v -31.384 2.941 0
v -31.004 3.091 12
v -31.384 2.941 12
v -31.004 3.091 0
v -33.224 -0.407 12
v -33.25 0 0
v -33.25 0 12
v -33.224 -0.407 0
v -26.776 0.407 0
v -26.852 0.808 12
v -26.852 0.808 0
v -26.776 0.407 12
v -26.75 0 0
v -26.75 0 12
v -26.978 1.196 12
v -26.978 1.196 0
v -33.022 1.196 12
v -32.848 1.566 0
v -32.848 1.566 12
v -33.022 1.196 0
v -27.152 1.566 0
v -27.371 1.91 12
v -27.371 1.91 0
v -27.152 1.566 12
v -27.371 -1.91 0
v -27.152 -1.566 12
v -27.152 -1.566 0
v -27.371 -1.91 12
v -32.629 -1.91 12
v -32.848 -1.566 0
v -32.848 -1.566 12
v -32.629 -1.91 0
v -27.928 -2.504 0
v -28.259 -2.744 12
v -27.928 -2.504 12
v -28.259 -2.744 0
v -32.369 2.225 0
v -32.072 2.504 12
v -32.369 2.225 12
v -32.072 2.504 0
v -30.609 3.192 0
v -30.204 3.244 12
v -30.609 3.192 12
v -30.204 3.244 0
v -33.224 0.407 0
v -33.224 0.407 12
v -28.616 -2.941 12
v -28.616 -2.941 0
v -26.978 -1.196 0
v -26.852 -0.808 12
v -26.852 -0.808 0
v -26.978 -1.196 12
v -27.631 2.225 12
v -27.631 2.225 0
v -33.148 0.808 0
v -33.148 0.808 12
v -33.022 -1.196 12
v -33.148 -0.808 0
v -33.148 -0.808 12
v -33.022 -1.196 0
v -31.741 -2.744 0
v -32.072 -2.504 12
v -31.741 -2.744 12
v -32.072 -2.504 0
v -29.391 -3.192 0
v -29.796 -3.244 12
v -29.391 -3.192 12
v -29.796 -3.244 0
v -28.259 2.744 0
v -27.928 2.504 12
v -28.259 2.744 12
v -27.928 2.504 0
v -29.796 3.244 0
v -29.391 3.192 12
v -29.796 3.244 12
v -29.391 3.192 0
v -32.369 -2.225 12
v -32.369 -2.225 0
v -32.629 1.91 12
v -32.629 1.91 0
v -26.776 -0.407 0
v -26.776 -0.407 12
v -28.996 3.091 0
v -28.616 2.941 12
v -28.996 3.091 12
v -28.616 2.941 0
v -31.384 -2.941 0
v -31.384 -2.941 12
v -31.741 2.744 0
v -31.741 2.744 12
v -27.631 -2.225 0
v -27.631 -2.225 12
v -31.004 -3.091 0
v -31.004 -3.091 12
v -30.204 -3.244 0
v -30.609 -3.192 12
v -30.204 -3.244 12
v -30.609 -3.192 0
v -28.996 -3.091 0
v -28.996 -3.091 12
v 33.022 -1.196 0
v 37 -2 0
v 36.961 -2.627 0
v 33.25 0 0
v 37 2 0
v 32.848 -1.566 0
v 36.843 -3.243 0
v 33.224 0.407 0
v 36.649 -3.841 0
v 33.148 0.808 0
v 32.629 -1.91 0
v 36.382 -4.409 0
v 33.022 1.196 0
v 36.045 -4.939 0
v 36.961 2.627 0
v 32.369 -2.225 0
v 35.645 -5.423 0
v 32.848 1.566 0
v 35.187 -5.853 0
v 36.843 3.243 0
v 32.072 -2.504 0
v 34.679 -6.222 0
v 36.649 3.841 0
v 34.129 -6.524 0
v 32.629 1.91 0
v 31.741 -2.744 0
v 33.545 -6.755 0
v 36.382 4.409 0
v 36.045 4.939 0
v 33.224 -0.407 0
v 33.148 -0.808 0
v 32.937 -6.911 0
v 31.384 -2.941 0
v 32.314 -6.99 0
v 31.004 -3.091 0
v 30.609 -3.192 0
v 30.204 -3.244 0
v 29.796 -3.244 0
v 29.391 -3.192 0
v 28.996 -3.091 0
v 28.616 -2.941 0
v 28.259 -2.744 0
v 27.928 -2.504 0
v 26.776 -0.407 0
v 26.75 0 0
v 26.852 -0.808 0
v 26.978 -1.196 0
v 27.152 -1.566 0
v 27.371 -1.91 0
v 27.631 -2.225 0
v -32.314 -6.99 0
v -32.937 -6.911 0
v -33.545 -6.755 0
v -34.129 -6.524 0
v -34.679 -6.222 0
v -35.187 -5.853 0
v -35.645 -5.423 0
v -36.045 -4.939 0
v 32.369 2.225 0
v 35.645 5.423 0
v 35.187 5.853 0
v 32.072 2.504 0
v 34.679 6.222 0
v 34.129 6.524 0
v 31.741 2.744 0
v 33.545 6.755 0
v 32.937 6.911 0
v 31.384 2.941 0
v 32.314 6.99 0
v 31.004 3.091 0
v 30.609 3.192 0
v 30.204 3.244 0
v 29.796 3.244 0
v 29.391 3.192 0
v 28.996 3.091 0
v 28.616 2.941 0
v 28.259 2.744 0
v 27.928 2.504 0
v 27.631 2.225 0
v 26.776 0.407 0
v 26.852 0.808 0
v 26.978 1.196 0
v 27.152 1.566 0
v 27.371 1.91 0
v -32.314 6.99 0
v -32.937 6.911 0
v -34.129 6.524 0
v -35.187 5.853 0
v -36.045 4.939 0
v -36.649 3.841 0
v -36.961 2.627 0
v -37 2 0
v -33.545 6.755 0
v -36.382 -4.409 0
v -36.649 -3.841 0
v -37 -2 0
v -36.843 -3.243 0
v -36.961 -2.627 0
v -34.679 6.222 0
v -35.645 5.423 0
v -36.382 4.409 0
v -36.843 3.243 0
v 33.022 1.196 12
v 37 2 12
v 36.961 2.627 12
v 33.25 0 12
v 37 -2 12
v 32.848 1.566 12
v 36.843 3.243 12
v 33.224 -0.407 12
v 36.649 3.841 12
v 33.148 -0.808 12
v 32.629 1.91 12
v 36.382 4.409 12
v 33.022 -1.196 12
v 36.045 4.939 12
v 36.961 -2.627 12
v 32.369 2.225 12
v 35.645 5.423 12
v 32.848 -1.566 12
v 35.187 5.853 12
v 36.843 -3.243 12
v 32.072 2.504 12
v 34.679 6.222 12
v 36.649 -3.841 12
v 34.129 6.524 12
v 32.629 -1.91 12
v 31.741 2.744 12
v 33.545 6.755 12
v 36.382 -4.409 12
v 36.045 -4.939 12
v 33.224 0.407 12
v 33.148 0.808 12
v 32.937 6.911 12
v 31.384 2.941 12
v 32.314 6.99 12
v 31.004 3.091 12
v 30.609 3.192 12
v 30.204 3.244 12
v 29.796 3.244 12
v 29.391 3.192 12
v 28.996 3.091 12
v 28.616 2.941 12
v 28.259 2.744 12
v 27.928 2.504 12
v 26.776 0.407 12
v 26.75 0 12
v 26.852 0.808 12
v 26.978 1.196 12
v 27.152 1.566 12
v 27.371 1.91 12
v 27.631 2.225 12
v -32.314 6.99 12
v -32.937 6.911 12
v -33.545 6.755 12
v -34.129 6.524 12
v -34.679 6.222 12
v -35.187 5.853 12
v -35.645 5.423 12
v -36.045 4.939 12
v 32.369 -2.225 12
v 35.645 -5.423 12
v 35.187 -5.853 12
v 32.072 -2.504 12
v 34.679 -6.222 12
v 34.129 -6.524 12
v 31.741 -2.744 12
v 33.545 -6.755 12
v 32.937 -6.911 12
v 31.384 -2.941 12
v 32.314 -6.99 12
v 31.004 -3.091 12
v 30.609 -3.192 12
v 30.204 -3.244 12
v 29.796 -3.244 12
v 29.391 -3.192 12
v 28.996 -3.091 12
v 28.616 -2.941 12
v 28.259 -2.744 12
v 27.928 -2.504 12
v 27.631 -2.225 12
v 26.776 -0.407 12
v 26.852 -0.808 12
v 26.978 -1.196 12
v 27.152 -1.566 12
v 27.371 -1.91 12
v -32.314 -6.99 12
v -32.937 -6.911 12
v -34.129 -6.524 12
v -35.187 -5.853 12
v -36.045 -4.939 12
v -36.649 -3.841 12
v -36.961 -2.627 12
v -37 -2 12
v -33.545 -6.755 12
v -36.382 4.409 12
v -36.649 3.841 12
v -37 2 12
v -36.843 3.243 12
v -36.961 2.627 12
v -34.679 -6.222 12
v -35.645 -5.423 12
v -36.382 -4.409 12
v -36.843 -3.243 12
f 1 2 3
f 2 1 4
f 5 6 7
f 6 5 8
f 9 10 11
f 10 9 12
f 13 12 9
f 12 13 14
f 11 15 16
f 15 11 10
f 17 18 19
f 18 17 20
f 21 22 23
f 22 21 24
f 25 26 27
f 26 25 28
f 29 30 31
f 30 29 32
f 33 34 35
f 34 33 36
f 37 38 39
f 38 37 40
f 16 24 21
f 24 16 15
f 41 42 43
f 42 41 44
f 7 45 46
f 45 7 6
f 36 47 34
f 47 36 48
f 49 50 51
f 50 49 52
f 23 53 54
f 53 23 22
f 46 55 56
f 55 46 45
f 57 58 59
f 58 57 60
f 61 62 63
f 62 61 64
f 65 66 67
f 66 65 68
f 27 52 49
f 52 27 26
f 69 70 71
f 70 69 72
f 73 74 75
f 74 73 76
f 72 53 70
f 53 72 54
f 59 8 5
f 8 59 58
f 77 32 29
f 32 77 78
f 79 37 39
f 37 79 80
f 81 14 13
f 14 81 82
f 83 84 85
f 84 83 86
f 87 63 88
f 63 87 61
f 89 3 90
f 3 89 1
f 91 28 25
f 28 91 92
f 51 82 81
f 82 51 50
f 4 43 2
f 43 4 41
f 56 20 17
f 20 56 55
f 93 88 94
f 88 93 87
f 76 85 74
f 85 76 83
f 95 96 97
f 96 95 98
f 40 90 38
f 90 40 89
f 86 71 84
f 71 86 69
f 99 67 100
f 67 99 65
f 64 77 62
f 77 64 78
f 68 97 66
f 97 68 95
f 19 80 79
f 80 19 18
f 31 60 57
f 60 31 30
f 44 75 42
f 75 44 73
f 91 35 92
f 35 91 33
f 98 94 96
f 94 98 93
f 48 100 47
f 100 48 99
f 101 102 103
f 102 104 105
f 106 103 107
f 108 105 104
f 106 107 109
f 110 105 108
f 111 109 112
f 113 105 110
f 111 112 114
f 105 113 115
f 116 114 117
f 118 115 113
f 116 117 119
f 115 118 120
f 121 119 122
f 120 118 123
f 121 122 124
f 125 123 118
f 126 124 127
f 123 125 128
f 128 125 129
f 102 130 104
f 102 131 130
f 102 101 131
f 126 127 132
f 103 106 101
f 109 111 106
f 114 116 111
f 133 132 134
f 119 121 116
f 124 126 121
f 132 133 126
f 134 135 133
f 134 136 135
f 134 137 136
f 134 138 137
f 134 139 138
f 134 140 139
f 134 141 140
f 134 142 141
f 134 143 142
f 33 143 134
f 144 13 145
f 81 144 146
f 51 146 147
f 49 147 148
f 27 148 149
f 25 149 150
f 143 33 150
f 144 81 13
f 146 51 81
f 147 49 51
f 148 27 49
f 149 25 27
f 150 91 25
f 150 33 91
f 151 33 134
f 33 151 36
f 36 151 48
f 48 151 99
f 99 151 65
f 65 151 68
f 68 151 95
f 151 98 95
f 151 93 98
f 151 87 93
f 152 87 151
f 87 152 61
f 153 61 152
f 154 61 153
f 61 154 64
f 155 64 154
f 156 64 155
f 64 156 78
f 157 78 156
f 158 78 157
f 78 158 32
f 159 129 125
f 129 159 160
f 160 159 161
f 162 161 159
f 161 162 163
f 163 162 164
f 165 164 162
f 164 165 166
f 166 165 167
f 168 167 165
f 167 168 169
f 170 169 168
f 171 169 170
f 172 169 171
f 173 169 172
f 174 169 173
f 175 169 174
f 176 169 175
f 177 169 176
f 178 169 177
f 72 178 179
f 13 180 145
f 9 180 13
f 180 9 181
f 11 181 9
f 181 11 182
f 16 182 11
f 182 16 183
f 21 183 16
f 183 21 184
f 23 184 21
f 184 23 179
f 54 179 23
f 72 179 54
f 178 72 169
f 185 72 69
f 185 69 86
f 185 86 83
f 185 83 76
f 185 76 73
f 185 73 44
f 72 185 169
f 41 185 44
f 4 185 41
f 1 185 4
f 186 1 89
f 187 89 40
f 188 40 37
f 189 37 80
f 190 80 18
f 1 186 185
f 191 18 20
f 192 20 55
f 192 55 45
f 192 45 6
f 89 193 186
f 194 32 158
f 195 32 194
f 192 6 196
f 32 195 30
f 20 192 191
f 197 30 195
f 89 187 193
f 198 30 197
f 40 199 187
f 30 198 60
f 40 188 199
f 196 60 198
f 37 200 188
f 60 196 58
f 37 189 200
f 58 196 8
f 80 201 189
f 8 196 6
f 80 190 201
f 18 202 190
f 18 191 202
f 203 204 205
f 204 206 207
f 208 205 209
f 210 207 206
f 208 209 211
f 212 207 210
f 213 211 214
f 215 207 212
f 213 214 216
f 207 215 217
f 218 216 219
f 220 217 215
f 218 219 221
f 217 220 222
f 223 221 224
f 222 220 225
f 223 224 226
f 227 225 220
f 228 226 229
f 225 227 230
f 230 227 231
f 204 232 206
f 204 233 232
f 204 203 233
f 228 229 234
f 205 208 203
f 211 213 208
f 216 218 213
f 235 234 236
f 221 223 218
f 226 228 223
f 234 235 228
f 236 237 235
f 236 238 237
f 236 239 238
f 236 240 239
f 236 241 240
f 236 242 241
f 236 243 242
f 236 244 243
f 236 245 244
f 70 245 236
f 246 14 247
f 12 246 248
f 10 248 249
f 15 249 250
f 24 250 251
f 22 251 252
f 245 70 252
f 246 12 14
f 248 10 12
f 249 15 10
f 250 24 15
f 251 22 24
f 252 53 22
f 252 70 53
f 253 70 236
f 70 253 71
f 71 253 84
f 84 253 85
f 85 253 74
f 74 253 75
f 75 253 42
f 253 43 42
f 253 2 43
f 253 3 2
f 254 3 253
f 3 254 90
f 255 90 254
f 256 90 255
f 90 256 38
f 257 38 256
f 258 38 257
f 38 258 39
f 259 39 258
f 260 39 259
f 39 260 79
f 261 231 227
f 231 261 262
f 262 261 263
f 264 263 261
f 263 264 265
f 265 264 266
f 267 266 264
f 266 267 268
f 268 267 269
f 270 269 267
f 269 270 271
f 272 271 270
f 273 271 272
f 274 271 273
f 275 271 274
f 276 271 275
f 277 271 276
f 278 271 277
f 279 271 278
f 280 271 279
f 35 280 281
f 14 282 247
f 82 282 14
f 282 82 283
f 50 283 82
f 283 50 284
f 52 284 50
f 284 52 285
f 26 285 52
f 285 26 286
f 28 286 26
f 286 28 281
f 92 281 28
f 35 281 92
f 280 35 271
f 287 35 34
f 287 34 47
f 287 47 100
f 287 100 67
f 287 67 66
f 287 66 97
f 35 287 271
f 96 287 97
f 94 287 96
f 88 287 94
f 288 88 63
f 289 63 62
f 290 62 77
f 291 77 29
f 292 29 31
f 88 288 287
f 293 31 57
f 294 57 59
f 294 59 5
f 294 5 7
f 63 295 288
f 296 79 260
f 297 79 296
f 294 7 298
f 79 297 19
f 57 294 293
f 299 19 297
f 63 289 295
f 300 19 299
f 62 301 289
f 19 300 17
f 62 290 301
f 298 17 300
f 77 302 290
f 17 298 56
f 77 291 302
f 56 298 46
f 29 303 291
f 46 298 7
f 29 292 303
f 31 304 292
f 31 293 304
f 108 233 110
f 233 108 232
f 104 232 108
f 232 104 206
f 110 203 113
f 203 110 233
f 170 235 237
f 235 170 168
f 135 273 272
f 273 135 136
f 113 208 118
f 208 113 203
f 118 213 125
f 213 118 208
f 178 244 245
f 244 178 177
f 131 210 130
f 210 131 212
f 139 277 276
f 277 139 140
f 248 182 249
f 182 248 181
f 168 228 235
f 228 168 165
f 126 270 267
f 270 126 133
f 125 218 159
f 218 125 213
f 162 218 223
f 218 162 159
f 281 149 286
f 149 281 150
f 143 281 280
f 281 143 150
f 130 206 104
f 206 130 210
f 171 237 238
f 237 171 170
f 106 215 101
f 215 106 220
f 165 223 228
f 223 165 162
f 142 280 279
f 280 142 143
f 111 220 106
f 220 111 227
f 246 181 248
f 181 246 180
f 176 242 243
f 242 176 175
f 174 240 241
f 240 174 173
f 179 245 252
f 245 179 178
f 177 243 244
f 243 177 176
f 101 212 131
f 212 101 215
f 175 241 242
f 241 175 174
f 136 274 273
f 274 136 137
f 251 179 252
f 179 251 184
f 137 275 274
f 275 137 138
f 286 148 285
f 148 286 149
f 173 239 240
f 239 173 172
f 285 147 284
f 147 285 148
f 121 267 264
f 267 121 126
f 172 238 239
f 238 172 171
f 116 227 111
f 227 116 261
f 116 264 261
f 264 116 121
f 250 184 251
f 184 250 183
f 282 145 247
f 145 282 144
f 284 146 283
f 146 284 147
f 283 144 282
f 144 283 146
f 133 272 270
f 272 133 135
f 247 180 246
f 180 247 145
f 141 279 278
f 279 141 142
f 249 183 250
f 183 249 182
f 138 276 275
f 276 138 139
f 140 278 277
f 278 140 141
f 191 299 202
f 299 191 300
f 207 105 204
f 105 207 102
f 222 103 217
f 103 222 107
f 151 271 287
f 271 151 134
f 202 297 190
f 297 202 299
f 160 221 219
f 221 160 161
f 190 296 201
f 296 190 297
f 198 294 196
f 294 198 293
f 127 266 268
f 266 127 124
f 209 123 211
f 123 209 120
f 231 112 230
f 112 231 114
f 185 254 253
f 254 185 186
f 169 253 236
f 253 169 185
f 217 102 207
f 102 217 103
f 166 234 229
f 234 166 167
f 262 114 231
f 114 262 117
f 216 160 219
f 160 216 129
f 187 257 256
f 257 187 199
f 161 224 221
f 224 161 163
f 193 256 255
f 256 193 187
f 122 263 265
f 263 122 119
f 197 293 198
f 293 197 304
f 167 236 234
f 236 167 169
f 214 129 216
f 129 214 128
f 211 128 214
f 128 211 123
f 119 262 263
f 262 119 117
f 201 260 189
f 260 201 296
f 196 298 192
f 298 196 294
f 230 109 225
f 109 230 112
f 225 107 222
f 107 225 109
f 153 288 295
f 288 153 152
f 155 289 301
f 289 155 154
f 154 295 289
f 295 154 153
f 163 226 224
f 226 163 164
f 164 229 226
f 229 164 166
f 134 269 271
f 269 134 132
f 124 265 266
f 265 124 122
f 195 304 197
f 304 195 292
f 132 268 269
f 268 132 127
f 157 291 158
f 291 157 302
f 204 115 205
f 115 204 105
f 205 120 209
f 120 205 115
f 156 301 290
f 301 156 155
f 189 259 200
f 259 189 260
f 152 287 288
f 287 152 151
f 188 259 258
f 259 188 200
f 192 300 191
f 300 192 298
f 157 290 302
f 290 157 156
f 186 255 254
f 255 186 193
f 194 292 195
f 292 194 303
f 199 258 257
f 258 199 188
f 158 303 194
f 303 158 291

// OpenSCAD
$fn = 50;


difference() {
	union() {
		hull() {
			translate(v = [-32.0000000000, 2.0000000000, 0]) {
				cylinder(h = 12, r = 5);
			}
			translate(v = [32.0000000000, 2.0000000000, 0]) {
				cylinder(h = 12, r = 5);
			}
			translate(v = [-32.0000000000, -2.0000000000, 0]) {
				cylinder(h = 12, r = 5);
			}
			translate(v = [32.0000000000, -2.0000000000, 0]) {
				cylinder(h = 12, r = 5);
			}
		}
	}
	union() {
		translate(v = [-30.0000000000, 0.0000000000, 0]) {
			cylinder(h = 12, r = 3.2500000000);
		}
		translate(v = [30.0000000000, 0.0000000000, 0]) {
			cylinder(h = 12, r = 3.2500000000);
		}
		translate(v = [-30.0000000000, 0.0000000000, 0]) {
			cylinder(h = 12, r = 1.8000000000);
		}
		translate(v = [30.0000000000, 0.0000000000, 0]) {
			cylinder(h = 12, r = 1.8000000000);
		}
		translate(v = [-30.0000000000, 0.0000000000, 0]) {
			cylinder(h = 12, r = 1.8000000000);
		}
		translate(v = [30.0000000000, 0.0000000000, 0]) {
			cylinder(h = 12, r = 1.8000000000);
		}
		translate(v = [-30.0000000000, 0.0000000000, 0]) {
			cylinder(h = 12, r = 1.8000000000);
		}
		translate(v = [30.0000000000, 0.0000000000, 0]) {
			cylinder(h = 12, r = 1.8000000000);
		}
	}
}
